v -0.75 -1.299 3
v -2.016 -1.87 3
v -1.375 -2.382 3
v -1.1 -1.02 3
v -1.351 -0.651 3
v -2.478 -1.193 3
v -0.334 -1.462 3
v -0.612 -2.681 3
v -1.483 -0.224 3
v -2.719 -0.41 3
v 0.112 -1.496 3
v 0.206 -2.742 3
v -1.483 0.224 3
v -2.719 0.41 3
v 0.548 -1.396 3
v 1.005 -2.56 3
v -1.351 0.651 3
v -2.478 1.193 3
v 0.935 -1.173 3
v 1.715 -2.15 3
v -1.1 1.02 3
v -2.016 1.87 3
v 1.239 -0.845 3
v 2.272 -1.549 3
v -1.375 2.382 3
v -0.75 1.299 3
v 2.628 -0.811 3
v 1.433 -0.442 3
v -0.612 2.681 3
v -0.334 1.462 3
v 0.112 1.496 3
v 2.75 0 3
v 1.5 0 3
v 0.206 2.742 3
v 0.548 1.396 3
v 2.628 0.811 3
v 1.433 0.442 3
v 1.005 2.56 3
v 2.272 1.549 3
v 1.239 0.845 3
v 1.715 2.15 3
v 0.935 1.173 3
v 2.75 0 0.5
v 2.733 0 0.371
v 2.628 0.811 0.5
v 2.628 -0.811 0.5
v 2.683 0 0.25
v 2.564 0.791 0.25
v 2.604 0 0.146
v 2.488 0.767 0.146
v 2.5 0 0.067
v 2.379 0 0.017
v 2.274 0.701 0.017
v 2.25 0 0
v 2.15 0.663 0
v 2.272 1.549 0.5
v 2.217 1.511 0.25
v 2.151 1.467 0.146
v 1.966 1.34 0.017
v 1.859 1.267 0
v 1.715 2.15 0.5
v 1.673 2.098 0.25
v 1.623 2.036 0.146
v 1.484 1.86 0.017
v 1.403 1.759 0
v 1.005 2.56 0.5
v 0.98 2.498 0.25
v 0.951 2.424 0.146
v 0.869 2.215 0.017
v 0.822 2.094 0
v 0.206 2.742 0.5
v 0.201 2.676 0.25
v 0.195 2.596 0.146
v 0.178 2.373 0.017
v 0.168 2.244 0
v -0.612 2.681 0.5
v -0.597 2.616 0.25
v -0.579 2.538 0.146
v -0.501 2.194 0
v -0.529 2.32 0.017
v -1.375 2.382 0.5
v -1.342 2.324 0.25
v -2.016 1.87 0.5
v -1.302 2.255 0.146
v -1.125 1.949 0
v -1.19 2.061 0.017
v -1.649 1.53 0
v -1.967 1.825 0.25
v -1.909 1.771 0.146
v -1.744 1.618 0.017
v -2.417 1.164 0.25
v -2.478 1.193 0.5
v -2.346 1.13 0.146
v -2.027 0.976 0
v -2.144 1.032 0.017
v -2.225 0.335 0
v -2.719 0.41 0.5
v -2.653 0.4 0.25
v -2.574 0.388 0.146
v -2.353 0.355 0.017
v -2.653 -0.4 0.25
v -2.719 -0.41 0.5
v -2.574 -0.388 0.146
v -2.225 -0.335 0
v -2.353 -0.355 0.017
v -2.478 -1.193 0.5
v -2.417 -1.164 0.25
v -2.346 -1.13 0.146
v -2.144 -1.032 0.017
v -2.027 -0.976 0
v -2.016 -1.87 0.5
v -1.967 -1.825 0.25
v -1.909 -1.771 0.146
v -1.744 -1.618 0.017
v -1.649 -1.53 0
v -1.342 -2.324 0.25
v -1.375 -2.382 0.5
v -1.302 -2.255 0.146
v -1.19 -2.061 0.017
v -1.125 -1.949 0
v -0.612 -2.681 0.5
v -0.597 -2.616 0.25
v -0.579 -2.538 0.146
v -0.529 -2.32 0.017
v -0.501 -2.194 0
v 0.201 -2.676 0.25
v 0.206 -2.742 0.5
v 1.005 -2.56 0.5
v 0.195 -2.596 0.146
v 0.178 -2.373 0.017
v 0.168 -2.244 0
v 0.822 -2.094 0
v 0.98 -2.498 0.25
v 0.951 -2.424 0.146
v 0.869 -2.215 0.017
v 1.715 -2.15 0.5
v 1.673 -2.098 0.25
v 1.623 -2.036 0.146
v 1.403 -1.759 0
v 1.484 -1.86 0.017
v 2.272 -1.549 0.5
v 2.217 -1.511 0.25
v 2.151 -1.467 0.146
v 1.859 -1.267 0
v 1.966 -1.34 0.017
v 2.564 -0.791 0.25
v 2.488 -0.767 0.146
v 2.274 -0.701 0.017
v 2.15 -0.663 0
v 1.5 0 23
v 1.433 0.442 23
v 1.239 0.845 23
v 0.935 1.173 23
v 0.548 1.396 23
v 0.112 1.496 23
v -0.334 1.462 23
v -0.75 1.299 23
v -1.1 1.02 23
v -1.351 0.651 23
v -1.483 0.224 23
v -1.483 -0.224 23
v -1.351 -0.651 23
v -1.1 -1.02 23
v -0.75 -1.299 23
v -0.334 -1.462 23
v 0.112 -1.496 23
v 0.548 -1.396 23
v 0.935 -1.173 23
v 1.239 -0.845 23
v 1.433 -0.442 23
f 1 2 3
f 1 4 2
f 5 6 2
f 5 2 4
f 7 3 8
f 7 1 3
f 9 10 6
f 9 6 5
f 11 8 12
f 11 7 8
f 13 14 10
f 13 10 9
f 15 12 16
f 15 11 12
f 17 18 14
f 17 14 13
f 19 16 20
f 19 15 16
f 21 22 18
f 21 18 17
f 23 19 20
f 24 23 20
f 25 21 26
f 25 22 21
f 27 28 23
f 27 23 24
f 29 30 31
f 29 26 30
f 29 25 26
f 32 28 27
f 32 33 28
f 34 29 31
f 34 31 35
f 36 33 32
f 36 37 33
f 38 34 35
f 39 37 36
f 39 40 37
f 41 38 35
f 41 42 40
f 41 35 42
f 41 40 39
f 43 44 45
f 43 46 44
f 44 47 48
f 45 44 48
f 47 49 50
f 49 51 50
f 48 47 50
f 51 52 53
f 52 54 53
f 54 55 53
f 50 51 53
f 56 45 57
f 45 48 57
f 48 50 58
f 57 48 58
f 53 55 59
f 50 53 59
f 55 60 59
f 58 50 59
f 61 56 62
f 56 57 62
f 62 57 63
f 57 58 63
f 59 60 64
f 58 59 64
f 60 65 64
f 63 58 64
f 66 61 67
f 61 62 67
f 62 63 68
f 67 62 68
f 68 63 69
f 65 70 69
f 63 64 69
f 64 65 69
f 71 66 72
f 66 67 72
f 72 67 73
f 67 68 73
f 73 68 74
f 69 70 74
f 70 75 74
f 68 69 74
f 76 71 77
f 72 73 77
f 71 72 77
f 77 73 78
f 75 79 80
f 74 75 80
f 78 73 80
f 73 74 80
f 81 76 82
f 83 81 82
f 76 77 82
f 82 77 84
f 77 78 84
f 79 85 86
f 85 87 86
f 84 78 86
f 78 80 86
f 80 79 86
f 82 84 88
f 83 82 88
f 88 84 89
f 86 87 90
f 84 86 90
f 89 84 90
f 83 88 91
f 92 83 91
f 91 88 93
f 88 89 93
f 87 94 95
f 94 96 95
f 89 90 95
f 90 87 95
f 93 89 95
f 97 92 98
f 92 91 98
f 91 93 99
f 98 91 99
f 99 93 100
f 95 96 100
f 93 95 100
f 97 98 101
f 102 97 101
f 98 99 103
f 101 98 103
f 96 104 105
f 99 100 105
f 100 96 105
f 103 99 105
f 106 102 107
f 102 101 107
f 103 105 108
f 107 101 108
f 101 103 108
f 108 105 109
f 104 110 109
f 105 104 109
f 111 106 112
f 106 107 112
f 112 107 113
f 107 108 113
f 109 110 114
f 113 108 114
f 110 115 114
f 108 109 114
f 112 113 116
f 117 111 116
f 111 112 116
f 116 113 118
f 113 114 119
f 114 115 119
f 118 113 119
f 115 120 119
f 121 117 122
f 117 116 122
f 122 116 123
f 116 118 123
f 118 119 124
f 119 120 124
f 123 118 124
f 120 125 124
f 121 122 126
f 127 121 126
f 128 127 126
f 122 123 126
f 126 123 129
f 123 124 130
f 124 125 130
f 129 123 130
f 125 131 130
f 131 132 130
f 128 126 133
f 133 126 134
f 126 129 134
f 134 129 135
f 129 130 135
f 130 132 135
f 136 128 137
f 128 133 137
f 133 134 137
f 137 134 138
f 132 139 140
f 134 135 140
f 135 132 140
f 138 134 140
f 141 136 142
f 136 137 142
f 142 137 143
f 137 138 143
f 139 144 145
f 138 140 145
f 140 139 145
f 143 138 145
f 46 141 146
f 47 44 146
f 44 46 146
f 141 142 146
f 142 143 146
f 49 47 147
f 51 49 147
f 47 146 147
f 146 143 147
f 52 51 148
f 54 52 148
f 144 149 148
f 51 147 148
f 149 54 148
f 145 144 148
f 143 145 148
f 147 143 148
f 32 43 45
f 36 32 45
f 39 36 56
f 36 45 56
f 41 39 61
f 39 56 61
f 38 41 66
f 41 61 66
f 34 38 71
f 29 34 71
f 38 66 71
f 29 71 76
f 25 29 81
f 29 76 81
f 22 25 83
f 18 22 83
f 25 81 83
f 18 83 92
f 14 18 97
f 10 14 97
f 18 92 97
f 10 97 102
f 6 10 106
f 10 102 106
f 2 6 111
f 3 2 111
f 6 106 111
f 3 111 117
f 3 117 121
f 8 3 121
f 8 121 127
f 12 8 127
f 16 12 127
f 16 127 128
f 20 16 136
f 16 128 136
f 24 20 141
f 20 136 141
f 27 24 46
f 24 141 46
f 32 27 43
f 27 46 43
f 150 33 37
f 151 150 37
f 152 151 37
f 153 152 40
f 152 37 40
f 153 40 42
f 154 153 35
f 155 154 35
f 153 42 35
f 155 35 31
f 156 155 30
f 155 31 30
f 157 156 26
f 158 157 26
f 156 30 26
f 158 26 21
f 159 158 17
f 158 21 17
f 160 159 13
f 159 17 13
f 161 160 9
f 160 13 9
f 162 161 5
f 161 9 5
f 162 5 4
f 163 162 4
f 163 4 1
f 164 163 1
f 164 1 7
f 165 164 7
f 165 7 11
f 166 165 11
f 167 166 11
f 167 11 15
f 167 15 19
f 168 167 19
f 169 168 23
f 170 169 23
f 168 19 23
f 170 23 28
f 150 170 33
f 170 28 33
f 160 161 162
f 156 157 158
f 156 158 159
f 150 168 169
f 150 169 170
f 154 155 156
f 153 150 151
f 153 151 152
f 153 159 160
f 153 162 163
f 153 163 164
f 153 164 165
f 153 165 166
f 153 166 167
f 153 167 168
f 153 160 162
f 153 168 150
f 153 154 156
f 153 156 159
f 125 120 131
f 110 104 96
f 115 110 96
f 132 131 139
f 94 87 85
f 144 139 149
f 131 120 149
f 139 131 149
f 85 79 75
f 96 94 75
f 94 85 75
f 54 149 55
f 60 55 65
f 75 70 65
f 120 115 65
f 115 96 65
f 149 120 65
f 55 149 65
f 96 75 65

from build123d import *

# Parameters (mm, degrees)
SKETCH_2_R      = 2.75
EXTRUDE_1_DEPTH = 3
SKETCH_3_R      = 1.5
EXTRUDE_2_DEPTH = 20
FILLET_1_R      = 0.5


with BuildPart() as part:
    # ｽｹｯﾁ2 → ﾎﾞｽ - 押し出し1 (new body)
    with BuildSketch(Plane.XY):
        Circle(SKETCH_2_R)
    extrude(amount=EXTRUDE_1_DEPTH)

    # ｽｹｯﾁ3 → ﾎﾞｽ - 押し出し2 (add)
    with BuildSketch(Plane.XY.offset(3)):
        Circle(SKETCH_3_R)
    extrude(amount=EXTRUDE_2_DEPTH)

    # ﾌｨﾚｯﾄ1
    fillet_1_edges = [part.edges().sort_by_distance(p)[0] for p in [
        (-2.75, 0, 0),
    ]]
    fillet(fillet_1_edges, radius=FILLET_1_R)


solid = part.part
